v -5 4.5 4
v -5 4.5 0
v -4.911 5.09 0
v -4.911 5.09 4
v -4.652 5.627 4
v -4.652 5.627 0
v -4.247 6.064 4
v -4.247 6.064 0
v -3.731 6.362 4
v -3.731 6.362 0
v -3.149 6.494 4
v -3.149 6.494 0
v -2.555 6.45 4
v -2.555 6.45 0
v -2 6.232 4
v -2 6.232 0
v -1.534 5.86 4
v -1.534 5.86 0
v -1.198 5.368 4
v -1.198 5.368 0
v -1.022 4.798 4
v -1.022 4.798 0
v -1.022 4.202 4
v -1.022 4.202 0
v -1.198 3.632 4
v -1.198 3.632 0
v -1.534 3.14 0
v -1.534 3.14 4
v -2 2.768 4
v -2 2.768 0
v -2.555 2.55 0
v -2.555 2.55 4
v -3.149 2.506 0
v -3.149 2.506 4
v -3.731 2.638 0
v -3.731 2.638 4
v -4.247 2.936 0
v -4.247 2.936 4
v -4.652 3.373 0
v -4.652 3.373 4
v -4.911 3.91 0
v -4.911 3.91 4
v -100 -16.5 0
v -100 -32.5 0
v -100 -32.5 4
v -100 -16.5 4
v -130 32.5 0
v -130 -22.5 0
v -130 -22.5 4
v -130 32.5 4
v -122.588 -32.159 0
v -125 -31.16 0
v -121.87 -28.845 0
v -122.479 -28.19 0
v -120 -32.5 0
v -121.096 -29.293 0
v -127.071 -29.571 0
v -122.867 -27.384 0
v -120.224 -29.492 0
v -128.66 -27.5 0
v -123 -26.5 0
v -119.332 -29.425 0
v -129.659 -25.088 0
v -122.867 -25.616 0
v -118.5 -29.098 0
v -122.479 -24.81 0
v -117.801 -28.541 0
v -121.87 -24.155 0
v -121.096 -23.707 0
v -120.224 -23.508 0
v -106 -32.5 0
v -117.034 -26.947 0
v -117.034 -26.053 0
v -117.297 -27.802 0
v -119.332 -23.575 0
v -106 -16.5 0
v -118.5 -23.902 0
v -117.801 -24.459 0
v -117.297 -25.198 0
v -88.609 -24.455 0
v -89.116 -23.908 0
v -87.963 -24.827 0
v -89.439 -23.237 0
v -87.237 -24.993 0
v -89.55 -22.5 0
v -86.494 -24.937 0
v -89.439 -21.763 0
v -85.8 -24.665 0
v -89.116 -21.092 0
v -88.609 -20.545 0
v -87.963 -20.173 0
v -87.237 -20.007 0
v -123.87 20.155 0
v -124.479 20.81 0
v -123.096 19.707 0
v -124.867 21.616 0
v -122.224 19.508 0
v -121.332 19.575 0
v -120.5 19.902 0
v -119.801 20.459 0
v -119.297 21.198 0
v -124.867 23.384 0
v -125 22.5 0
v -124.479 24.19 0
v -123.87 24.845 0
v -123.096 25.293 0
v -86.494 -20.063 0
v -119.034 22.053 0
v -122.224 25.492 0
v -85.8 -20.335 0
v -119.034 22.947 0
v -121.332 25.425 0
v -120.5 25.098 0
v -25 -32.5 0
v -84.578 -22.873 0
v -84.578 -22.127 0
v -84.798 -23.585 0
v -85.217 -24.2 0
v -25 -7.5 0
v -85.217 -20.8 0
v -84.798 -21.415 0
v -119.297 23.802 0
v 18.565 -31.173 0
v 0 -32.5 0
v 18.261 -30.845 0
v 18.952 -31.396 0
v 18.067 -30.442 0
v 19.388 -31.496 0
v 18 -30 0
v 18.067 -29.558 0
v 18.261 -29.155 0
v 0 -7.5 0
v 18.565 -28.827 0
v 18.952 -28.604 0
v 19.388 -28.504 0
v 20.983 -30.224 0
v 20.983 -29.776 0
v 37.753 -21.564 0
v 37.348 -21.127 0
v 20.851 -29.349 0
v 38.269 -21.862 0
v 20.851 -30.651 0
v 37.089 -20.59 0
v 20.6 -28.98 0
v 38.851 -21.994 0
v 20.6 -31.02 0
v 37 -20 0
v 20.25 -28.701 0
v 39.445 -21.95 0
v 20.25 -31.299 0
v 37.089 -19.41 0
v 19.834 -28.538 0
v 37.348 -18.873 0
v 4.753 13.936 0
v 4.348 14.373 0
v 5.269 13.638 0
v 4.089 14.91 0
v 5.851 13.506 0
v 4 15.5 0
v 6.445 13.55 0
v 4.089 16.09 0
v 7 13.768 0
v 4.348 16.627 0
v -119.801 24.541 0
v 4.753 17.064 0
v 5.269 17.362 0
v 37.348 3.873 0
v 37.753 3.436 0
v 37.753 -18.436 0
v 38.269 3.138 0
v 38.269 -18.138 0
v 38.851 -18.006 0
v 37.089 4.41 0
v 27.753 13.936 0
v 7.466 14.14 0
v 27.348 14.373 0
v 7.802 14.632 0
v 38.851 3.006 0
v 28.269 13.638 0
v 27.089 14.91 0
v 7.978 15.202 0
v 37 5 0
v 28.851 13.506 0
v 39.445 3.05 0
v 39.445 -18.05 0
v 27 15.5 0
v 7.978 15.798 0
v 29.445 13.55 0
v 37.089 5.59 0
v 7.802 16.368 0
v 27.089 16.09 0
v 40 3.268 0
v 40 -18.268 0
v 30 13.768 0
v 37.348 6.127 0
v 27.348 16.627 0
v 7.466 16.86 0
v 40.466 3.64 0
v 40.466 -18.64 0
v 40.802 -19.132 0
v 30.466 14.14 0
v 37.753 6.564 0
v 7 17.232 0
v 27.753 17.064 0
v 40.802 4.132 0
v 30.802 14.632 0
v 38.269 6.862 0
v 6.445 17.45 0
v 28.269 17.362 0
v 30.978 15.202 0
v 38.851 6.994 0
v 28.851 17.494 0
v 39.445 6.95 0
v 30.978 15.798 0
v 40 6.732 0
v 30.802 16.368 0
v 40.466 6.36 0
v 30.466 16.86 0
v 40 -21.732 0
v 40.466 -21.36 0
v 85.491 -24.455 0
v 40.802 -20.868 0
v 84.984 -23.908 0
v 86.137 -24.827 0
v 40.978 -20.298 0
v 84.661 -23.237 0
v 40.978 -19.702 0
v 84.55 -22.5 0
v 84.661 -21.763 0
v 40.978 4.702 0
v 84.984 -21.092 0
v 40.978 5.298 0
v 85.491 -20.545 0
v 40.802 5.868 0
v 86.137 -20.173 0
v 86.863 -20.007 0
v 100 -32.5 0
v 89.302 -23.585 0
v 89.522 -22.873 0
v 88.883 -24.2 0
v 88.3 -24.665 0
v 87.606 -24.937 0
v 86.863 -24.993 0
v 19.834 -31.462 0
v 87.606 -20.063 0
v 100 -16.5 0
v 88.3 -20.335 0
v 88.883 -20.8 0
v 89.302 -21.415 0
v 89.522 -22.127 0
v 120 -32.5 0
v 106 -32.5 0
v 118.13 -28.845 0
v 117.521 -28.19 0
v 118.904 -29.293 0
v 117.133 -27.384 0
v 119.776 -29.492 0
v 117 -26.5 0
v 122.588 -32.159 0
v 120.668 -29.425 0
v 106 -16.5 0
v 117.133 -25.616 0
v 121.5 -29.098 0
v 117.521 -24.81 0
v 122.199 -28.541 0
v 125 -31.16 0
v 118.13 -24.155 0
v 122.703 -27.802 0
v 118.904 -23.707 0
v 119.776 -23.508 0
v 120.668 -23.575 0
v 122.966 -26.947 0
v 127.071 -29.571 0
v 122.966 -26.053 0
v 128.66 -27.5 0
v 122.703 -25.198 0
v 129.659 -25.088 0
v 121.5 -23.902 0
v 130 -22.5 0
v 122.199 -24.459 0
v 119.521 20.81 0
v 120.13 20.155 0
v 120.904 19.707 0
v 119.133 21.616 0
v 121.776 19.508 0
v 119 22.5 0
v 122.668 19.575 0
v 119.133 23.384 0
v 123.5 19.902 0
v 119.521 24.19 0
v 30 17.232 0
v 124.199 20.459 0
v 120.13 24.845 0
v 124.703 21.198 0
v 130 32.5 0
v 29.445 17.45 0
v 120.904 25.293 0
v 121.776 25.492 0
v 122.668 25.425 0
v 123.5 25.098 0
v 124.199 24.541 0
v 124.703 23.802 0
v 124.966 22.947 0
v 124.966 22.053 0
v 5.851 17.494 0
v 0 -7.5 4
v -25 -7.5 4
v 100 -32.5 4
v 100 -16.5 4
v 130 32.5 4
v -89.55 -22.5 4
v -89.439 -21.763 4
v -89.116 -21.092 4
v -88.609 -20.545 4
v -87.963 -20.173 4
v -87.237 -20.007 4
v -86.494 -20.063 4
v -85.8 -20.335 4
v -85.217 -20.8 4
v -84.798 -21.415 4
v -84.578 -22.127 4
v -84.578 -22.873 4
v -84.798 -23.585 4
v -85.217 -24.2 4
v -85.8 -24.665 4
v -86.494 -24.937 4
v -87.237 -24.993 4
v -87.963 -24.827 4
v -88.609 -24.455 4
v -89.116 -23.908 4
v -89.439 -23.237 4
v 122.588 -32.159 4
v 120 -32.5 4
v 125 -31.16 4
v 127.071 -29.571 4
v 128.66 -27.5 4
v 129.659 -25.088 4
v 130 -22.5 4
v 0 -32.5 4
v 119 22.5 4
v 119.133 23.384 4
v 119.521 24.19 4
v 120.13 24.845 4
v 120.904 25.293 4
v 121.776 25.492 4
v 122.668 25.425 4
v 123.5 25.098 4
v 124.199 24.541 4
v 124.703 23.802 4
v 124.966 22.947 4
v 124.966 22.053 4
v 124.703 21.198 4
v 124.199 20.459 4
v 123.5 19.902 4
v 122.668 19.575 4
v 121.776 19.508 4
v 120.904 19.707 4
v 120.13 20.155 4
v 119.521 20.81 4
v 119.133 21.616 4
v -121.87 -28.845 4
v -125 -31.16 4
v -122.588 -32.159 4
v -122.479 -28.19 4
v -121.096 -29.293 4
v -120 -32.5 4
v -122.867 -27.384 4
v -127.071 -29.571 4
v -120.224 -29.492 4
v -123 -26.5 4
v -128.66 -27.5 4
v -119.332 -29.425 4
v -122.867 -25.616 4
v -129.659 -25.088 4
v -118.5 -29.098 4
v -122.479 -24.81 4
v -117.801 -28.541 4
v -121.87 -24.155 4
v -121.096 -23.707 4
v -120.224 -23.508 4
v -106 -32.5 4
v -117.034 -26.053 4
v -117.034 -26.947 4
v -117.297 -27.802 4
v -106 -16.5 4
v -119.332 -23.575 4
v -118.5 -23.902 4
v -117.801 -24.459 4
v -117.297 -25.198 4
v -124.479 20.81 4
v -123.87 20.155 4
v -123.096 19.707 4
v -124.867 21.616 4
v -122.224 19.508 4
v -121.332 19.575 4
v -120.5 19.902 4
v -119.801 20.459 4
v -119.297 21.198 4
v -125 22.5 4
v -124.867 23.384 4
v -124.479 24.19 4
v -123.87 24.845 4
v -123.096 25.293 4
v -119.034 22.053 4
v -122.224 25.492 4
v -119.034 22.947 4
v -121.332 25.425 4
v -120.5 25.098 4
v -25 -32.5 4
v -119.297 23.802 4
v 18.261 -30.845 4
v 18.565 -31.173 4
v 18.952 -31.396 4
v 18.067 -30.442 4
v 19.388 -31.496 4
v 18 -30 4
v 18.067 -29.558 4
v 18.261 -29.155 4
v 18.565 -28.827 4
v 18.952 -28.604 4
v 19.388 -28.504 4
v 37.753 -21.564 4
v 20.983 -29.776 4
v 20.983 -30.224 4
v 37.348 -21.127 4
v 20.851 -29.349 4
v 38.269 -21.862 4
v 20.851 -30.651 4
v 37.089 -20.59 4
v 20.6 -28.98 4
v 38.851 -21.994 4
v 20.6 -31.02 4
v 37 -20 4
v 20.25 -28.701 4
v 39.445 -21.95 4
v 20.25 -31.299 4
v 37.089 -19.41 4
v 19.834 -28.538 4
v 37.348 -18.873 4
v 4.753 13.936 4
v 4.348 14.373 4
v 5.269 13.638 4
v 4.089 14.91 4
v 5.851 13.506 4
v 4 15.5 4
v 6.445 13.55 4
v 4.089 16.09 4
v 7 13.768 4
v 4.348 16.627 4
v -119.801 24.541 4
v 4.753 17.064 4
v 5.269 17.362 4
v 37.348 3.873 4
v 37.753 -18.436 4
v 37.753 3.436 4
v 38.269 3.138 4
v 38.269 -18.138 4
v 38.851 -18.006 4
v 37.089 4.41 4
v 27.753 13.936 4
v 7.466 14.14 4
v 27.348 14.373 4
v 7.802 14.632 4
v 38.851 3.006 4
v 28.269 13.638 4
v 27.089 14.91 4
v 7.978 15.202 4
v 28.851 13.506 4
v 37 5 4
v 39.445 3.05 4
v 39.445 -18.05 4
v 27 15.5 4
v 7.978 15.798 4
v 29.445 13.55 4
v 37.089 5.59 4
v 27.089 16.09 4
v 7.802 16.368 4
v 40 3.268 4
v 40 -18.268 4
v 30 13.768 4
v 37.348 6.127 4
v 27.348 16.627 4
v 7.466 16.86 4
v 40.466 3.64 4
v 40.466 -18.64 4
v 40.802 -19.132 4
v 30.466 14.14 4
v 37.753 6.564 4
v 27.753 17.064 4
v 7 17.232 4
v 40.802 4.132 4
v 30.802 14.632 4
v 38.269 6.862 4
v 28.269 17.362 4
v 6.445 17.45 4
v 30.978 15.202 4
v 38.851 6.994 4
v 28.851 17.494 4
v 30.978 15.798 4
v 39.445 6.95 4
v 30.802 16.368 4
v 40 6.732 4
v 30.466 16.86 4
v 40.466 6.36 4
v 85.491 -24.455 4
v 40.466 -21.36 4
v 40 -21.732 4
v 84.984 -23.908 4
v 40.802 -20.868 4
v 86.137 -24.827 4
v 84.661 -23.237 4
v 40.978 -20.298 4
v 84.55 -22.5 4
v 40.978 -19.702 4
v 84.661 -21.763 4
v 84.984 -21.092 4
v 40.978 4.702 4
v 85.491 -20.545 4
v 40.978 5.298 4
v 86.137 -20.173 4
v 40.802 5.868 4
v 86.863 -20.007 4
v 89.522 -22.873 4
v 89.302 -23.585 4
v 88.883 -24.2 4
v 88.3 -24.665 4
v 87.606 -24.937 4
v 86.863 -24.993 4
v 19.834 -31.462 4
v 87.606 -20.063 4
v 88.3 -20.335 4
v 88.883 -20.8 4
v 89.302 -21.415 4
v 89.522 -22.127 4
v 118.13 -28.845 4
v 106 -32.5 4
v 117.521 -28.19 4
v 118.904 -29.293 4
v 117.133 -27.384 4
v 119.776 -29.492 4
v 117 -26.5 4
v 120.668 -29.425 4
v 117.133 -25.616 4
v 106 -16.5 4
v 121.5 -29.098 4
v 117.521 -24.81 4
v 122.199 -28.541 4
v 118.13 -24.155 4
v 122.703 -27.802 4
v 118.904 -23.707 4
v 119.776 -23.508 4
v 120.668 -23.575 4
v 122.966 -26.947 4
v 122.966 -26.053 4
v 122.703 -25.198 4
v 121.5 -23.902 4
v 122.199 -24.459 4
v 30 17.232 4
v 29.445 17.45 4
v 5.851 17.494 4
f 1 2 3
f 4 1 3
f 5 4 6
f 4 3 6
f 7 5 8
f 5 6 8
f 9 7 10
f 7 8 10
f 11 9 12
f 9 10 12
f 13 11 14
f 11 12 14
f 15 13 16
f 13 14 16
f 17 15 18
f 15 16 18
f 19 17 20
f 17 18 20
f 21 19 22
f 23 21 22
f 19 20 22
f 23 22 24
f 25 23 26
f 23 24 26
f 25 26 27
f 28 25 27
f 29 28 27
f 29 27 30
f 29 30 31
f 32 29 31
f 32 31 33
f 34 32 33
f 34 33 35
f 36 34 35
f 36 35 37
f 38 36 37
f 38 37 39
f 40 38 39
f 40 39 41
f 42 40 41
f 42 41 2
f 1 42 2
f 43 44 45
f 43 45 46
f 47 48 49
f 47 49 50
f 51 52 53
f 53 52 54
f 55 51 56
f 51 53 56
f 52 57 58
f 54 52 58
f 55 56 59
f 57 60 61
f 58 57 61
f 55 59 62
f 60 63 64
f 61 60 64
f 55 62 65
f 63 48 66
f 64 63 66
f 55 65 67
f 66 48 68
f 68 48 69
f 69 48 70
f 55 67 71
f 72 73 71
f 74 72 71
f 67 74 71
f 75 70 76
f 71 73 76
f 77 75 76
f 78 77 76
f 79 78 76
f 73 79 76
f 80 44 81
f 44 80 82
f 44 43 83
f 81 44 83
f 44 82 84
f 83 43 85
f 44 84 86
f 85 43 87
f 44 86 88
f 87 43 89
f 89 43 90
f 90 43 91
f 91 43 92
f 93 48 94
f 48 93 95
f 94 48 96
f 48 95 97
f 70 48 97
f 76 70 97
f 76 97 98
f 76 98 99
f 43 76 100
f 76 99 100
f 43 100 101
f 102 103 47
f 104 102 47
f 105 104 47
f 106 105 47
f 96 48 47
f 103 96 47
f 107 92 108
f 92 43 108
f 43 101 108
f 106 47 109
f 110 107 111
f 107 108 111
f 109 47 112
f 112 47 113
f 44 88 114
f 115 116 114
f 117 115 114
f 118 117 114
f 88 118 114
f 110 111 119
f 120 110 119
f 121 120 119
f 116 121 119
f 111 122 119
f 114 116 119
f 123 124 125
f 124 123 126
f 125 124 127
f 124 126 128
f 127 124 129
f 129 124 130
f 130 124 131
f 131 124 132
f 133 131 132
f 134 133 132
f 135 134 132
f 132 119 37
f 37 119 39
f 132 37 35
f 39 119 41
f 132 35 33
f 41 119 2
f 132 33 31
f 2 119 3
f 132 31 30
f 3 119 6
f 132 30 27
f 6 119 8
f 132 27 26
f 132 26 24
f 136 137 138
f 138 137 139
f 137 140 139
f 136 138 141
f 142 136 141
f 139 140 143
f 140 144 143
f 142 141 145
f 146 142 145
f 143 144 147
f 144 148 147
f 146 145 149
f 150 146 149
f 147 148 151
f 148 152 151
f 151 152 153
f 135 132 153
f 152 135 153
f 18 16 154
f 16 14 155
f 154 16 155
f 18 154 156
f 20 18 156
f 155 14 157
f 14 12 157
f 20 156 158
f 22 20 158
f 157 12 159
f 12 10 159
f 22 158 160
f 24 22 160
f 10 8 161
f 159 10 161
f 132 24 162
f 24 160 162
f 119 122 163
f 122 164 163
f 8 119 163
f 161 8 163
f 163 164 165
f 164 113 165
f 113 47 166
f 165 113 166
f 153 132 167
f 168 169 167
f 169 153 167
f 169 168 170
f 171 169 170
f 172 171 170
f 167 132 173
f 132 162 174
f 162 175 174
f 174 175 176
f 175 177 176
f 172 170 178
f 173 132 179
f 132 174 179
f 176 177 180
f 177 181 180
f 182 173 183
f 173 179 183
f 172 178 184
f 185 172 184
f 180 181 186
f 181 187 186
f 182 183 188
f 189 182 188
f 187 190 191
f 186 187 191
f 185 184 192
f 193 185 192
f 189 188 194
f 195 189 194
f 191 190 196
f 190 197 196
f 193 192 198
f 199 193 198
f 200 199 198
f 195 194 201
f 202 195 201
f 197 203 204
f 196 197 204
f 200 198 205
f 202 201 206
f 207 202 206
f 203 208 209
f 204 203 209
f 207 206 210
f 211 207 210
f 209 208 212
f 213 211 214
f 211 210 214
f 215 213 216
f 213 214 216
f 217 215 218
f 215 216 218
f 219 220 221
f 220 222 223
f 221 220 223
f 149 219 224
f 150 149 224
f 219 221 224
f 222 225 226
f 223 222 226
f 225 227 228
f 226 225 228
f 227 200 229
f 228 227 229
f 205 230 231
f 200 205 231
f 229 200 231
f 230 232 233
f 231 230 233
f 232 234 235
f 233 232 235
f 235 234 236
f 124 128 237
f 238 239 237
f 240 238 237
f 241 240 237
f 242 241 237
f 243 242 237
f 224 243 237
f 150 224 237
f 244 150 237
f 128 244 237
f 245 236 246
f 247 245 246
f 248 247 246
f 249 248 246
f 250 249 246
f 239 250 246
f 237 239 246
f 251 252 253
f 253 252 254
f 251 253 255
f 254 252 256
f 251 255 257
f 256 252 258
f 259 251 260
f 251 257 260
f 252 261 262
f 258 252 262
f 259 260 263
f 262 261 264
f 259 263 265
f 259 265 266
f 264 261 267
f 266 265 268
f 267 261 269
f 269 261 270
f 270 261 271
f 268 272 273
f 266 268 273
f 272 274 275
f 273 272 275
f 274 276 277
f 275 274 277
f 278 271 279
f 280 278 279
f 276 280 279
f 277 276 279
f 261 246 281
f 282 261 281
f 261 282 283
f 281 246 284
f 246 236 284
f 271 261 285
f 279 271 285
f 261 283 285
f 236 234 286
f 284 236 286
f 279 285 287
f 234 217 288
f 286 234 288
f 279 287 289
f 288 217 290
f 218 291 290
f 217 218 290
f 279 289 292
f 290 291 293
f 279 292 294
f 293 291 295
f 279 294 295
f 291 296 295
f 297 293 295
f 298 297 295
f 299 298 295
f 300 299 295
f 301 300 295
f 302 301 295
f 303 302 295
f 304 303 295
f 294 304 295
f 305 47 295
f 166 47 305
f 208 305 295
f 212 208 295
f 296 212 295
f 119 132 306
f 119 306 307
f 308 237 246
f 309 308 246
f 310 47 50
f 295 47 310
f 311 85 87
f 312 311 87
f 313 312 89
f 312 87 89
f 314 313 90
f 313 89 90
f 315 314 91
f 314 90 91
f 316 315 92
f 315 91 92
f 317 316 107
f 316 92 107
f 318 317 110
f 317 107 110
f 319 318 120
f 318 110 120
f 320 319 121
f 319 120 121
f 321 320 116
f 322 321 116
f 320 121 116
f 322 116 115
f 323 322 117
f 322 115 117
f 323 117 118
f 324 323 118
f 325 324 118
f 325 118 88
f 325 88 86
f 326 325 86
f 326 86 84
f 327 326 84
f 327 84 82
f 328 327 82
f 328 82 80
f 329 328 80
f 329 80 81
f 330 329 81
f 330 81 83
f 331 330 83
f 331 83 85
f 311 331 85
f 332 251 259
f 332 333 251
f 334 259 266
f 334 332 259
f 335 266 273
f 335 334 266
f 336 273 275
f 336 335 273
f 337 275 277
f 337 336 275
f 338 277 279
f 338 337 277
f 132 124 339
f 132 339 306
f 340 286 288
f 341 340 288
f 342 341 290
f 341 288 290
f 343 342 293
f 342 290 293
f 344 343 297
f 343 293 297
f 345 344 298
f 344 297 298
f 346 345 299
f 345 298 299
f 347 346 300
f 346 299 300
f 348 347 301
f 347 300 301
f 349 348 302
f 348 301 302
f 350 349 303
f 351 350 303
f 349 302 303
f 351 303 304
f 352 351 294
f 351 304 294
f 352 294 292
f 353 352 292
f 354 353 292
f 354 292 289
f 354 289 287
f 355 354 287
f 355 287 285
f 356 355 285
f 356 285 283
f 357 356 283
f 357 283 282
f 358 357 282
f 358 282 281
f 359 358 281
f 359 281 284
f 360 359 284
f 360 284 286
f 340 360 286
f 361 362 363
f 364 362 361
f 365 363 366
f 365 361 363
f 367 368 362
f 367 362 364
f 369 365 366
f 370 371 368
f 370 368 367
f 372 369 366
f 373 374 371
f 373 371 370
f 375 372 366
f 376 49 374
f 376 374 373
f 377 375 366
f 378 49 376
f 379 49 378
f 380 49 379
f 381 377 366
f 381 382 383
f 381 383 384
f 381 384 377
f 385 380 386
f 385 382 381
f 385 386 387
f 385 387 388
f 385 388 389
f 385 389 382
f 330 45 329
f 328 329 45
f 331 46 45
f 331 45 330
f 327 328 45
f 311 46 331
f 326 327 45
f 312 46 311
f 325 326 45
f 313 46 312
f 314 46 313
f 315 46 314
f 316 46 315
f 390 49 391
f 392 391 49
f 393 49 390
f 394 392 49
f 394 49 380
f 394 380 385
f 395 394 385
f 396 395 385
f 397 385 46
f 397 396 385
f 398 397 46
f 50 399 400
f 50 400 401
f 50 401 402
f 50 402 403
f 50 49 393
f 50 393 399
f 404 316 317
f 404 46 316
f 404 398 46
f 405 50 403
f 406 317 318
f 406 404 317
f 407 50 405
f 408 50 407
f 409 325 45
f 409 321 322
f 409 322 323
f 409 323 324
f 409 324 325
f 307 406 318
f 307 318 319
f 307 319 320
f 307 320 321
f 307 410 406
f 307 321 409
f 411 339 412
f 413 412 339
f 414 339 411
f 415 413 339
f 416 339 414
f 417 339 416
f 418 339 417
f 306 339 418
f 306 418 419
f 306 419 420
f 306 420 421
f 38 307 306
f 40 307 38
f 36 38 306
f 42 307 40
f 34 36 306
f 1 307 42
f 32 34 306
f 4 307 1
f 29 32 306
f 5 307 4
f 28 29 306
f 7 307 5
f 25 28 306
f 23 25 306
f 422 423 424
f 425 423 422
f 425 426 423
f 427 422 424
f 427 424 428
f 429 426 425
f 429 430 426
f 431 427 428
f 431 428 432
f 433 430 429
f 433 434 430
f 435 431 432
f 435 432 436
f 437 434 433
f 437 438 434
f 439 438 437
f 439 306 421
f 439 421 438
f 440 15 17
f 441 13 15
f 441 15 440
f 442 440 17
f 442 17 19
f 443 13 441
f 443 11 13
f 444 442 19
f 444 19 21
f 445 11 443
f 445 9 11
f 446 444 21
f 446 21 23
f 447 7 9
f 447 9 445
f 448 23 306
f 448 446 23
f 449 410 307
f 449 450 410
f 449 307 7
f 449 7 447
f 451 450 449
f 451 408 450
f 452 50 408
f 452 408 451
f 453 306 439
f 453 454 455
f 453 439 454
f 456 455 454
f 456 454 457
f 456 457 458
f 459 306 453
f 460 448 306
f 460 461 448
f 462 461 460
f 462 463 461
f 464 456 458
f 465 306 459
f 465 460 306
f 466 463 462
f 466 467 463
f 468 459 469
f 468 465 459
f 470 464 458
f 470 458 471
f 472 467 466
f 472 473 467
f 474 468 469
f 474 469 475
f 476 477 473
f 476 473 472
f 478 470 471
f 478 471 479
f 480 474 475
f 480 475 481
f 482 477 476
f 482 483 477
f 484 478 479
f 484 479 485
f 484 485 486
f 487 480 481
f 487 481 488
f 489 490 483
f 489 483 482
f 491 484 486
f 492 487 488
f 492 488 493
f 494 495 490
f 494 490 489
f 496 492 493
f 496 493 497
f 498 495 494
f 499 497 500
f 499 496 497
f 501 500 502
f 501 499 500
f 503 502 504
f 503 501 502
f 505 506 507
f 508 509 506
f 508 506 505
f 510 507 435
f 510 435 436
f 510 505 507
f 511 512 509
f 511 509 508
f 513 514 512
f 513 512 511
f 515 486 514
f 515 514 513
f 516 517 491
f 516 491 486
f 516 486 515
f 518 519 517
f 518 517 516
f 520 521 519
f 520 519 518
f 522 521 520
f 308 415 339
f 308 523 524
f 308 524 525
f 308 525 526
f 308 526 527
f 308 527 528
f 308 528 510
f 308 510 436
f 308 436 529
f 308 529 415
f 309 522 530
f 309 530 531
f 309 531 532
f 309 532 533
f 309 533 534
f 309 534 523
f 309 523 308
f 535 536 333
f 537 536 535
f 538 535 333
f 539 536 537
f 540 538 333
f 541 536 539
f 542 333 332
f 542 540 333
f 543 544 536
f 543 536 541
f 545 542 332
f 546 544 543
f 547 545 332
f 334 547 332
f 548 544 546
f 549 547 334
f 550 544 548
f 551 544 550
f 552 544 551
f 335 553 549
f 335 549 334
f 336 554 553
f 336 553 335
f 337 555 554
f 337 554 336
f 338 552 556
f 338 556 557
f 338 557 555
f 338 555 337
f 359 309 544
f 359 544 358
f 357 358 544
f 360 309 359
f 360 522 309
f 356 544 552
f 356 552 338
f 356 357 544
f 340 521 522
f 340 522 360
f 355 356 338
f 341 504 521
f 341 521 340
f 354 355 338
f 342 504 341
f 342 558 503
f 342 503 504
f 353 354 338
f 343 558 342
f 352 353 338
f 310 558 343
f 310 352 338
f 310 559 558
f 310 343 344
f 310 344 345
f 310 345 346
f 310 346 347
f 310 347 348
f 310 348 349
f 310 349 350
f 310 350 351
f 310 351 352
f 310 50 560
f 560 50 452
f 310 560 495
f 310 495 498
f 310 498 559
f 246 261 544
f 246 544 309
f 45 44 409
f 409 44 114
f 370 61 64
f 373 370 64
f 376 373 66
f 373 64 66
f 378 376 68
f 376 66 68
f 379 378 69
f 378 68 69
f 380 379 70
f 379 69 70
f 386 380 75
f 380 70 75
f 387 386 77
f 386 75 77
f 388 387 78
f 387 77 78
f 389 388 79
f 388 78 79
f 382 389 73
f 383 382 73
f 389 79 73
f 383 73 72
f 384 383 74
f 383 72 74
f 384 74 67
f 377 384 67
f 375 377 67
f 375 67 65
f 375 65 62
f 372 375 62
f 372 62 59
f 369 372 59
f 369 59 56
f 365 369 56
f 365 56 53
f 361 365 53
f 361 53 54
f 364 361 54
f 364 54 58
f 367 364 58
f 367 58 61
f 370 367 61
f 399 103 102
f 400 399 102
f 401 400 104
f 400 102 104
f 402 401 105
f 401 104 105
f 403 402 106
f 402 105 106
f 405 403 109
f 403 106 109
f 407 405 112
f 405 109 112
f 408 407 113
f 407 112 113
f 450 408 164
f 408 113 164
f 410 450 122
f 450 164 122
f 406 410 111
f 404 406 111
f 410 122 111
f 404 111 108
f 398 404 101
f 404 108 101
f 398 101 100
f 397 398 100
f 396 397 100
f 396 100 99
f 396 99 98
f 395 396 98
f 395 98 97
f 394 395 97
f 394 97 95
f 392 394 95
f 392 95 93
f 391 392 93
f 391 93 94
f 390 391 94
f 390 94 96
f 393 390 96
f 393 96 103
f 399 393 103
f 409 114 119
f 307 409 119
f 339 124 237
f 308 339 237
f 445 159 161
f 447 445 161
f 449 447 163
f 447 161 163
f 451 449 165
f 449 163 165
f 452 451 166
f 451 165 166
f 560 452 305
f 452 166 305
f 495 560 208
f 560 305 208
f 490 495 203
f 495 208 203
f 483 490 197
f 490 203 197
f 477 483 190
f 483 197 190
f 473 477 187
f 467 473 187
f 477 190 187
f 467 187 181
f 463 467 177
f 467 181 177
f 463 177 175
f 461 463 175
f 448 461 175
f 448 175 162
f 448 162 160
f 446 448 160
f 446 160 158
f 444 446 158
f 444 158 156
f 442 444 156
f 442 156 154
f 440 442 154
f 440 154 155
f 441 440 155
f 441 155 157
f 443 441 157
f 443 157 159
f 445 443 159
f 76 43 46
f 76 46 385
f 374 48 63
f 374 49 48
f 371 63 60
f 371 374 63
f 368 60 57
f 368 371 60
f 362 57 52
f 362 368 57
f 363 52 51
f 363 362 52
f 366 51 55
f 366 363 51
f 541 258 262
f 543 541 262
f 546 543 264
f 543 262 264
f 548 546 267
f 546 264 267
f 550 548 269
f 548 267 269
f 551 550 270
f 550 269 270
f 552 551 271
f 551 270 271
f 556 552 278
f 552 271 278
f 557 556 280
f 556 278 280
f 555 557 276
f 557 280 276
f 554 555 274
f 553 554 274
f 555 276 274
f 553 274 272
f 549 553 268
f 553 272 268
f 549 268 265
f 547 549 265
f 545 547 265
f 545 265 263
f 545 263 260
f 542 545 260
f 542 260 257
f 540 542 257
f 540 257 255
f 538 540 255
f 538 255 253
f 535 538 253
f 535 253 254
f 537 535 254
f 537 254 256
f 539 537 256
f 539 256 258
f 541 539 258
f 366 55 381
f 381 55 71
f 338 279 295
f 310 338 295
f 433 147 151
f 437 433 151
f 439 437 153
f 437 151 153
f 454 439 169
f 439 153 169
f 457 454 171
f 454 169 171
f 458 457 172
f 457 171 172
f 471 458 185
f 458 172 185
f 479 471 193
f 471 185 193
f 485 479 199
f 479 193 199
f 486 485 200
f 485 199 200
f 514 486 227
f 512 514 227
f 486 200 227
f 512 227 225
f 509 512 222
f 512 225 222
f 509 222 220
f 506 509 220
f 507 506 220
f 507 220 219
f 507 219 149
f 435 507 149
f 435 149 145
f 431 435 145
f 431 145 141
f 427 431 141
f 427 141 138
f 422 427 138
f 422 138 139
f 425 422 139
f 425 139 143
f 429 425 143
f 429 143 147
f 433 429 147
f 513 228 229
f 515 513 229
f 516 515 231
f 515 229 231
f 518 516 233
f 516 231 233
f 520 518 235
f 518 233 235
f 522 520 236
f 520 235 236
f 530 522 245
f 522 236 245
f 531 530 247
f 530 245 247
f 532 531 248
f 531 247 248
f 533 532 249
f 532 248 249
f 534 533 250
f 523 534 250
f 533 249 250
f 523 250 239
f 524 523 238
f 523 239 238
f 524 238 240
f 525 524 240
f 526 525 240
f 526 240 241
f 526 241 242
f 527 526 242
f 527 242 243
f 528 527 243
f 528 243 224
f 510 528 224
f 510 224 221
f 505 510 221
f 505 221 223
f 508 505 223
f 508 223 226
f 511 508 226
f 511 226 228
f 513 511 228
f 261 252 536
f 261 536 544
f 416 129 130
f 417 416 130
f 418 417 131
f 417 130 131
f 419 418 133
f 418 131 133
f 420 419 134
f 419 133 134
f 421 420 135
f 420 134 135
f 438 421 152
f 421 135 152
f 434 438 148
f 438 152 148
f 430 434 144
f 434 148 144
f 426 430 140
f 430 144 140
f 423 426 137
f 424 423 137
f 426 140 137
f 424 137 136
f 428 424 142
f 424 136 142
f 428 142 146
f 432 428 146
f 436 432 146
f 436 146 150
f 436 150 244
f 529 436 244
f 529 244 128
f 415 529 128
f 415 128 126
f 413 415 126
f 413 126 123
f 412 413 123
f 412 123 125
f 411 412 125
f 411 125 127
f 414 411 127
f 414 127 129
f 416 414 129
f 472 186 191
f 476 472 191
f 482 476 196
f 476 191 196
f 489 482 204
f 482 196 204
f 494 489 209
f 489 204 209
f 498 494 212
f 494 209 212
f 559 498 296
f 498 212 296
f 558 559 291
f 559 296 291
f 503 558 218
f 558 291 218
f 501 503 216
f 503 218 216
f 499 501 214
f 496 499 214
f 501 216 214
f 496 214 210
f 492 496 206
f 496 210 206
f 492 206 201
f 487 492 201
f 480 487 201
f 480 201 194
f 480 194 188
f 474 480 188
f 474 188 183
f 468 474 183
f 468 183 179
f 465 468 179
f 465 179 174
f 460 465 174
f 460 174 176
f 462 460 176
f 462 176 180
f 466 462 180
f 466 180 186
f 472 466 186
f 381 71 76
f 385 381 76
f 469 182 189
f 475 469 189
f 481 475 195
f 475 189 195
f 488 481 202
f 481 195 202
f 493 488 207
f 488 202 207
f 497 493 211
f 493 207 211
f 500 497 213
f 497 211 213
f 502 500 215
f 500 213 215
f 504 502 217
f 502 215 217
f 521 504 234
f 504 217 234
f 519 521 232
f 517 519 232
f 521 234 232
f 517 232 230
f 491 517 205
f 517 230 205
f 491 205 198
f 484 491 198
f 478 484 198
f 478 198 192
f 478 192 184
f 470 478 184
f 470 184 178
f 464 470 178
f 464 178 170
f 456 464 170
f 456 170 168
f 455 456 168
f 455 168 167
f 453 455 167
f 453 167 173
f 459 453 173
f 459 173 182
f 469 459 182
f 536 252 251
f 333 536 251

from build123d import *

# Parameters (mm, degrees)
SKETCH1_W           = 260
SKETCH1_H           = 65
BOSS_EXTRUDE2_DEPTH = 4
SKETCH3_R           = 3
CUT_EXTRUDE2_DEPTH  = 135.060620616
FILLET1_R           = 10
SKETCH4_W           = 25
SKETCH4_H           = 25
CUT_EXTRUDE3_DEPTH  = 10
SKETCH5_W           = 6
SKETCH5_H           = 16
CUT_EXTRUDE4_DEPTH  = 135.060620616
SKETCH6_R           = 2.5
CUT_EXTRUDE5_DEPTH  = 135.060620616
SKETCH7_R           = 2
SKETCH7_R_2         = 1.5
CUT_EXTRUDE6_DEPTH  = 10


with BuildPart() as part:
    # Sketch1 → Boss-Extrude2 (new body)
    with BuildSketch(Plane.XY):
        Rectangle(SKETCH1_W, SKETCH1_H)
    extrude(amount=BOSS_EXTRUDE2_DEPTH)

    # Sketch3 → Cut-Extrude2 (cut, through all)
    with BuildSketch(Plane(origin=(0, 0, 0), x_dir=(-1, 0, 0), z_dir=(0, 0, -1))):
        with Locations((120, -26.5)):
            Circle(SKETCH3_R)
        with Locations((-120, -26.5)):
            Circle(SKETCH3_R)
        with Locations((-122, 22.5)):
            Circle(SKETCH3_R)
        with Locations((122, 22.5)):
            Circle(SKETCH3_R)
    extrude(amount=-CUT_EXTRUDE2_DEPTH, mode=Mode.SUBTRACT)

    # Fillet1
    fillet1_edges = [part.edges().sort_by_distance(p)[0] for p in [
        (130, -32.5, 2),
        (-130, -32.5, 2),
    ]]
    fillet(fillet1_edges, radius=FILLET1_R)

    # Sketch4 → Cut-Extrude3 (cut)
    with BuildSketch(Plane(origin=(0, 0, 0), x_dir=(-1, 0, 0), z_dir=(0, 0, -1))):
        with Locations((12.5, -20)):
            Rectangle(SKETCH4_W, SKETCH4_H)
    extrude(amount=-CUT_EXTRUDE3_DEPTH, mode=Mode.SUBTRACT)

    # Sketch5 → Cut-Extrude4 (cut, through all)
    with BuildSketch(Plane(origin=(0, 0, 0), x_dir=(-1, 0, 0), z_dir=(0, 0, -1))):
        with Locations((-103, -24.5)):
            Rectangle(SKETCH5_W, SKETCH5_H)
        with Locations((103, -24.5)):
            Rectangle(SKETCH5_W, SKETCH5_H)
    extrude(amount=-CUT_EXTRUDE4_DEPTH, mode=Mode.SUBTRACT)

    # Sketch6 → Cut-Extrude5 (cut, through all)
    with BuildSketch(Plane(origin=(0, 0, 0), x_dir=(-1, 0, 0), z_dir=(0, 0, -1))):
        with Locations((87.05, -22.5)):
            Circle(SKETCH6_R)
        with Locations((-87.05, -22.5)):
            Circle(SKETCH6_R)
    extrude(amount=-CUT_EXTRUDE5_DEPTH, mode=Mode.SUBTRACT)

    # Sketch7 → Cut-Extrude6 (cut)
    with BuildSketch(Plane(origin=(0, 0, 0), x_dir=(-1, 0, 0), z_dir=(0, 0, -1))):
        with Locations((-39, -20)):
            Circle(SKETCH7_R)
        with Locations((-39, 5)):
            Circle(SKETCH7_R)
        with Locations((-29, 15.5)):
            Circle(SKETCH7_R)
        with Locations((-6, 15.5)):
            Circle(SKETCH7_R)
        with Locations((3, 4.5)):
            Circle(SKETCH7_R)
        with Locations((-19.5, -30)):
            Circle(SKETCH7_R_2)
    extrude(amount=-CUT_EXTRUDE6_DEPTH, mode=Mode.SUBTRACT)


solid = part.part
